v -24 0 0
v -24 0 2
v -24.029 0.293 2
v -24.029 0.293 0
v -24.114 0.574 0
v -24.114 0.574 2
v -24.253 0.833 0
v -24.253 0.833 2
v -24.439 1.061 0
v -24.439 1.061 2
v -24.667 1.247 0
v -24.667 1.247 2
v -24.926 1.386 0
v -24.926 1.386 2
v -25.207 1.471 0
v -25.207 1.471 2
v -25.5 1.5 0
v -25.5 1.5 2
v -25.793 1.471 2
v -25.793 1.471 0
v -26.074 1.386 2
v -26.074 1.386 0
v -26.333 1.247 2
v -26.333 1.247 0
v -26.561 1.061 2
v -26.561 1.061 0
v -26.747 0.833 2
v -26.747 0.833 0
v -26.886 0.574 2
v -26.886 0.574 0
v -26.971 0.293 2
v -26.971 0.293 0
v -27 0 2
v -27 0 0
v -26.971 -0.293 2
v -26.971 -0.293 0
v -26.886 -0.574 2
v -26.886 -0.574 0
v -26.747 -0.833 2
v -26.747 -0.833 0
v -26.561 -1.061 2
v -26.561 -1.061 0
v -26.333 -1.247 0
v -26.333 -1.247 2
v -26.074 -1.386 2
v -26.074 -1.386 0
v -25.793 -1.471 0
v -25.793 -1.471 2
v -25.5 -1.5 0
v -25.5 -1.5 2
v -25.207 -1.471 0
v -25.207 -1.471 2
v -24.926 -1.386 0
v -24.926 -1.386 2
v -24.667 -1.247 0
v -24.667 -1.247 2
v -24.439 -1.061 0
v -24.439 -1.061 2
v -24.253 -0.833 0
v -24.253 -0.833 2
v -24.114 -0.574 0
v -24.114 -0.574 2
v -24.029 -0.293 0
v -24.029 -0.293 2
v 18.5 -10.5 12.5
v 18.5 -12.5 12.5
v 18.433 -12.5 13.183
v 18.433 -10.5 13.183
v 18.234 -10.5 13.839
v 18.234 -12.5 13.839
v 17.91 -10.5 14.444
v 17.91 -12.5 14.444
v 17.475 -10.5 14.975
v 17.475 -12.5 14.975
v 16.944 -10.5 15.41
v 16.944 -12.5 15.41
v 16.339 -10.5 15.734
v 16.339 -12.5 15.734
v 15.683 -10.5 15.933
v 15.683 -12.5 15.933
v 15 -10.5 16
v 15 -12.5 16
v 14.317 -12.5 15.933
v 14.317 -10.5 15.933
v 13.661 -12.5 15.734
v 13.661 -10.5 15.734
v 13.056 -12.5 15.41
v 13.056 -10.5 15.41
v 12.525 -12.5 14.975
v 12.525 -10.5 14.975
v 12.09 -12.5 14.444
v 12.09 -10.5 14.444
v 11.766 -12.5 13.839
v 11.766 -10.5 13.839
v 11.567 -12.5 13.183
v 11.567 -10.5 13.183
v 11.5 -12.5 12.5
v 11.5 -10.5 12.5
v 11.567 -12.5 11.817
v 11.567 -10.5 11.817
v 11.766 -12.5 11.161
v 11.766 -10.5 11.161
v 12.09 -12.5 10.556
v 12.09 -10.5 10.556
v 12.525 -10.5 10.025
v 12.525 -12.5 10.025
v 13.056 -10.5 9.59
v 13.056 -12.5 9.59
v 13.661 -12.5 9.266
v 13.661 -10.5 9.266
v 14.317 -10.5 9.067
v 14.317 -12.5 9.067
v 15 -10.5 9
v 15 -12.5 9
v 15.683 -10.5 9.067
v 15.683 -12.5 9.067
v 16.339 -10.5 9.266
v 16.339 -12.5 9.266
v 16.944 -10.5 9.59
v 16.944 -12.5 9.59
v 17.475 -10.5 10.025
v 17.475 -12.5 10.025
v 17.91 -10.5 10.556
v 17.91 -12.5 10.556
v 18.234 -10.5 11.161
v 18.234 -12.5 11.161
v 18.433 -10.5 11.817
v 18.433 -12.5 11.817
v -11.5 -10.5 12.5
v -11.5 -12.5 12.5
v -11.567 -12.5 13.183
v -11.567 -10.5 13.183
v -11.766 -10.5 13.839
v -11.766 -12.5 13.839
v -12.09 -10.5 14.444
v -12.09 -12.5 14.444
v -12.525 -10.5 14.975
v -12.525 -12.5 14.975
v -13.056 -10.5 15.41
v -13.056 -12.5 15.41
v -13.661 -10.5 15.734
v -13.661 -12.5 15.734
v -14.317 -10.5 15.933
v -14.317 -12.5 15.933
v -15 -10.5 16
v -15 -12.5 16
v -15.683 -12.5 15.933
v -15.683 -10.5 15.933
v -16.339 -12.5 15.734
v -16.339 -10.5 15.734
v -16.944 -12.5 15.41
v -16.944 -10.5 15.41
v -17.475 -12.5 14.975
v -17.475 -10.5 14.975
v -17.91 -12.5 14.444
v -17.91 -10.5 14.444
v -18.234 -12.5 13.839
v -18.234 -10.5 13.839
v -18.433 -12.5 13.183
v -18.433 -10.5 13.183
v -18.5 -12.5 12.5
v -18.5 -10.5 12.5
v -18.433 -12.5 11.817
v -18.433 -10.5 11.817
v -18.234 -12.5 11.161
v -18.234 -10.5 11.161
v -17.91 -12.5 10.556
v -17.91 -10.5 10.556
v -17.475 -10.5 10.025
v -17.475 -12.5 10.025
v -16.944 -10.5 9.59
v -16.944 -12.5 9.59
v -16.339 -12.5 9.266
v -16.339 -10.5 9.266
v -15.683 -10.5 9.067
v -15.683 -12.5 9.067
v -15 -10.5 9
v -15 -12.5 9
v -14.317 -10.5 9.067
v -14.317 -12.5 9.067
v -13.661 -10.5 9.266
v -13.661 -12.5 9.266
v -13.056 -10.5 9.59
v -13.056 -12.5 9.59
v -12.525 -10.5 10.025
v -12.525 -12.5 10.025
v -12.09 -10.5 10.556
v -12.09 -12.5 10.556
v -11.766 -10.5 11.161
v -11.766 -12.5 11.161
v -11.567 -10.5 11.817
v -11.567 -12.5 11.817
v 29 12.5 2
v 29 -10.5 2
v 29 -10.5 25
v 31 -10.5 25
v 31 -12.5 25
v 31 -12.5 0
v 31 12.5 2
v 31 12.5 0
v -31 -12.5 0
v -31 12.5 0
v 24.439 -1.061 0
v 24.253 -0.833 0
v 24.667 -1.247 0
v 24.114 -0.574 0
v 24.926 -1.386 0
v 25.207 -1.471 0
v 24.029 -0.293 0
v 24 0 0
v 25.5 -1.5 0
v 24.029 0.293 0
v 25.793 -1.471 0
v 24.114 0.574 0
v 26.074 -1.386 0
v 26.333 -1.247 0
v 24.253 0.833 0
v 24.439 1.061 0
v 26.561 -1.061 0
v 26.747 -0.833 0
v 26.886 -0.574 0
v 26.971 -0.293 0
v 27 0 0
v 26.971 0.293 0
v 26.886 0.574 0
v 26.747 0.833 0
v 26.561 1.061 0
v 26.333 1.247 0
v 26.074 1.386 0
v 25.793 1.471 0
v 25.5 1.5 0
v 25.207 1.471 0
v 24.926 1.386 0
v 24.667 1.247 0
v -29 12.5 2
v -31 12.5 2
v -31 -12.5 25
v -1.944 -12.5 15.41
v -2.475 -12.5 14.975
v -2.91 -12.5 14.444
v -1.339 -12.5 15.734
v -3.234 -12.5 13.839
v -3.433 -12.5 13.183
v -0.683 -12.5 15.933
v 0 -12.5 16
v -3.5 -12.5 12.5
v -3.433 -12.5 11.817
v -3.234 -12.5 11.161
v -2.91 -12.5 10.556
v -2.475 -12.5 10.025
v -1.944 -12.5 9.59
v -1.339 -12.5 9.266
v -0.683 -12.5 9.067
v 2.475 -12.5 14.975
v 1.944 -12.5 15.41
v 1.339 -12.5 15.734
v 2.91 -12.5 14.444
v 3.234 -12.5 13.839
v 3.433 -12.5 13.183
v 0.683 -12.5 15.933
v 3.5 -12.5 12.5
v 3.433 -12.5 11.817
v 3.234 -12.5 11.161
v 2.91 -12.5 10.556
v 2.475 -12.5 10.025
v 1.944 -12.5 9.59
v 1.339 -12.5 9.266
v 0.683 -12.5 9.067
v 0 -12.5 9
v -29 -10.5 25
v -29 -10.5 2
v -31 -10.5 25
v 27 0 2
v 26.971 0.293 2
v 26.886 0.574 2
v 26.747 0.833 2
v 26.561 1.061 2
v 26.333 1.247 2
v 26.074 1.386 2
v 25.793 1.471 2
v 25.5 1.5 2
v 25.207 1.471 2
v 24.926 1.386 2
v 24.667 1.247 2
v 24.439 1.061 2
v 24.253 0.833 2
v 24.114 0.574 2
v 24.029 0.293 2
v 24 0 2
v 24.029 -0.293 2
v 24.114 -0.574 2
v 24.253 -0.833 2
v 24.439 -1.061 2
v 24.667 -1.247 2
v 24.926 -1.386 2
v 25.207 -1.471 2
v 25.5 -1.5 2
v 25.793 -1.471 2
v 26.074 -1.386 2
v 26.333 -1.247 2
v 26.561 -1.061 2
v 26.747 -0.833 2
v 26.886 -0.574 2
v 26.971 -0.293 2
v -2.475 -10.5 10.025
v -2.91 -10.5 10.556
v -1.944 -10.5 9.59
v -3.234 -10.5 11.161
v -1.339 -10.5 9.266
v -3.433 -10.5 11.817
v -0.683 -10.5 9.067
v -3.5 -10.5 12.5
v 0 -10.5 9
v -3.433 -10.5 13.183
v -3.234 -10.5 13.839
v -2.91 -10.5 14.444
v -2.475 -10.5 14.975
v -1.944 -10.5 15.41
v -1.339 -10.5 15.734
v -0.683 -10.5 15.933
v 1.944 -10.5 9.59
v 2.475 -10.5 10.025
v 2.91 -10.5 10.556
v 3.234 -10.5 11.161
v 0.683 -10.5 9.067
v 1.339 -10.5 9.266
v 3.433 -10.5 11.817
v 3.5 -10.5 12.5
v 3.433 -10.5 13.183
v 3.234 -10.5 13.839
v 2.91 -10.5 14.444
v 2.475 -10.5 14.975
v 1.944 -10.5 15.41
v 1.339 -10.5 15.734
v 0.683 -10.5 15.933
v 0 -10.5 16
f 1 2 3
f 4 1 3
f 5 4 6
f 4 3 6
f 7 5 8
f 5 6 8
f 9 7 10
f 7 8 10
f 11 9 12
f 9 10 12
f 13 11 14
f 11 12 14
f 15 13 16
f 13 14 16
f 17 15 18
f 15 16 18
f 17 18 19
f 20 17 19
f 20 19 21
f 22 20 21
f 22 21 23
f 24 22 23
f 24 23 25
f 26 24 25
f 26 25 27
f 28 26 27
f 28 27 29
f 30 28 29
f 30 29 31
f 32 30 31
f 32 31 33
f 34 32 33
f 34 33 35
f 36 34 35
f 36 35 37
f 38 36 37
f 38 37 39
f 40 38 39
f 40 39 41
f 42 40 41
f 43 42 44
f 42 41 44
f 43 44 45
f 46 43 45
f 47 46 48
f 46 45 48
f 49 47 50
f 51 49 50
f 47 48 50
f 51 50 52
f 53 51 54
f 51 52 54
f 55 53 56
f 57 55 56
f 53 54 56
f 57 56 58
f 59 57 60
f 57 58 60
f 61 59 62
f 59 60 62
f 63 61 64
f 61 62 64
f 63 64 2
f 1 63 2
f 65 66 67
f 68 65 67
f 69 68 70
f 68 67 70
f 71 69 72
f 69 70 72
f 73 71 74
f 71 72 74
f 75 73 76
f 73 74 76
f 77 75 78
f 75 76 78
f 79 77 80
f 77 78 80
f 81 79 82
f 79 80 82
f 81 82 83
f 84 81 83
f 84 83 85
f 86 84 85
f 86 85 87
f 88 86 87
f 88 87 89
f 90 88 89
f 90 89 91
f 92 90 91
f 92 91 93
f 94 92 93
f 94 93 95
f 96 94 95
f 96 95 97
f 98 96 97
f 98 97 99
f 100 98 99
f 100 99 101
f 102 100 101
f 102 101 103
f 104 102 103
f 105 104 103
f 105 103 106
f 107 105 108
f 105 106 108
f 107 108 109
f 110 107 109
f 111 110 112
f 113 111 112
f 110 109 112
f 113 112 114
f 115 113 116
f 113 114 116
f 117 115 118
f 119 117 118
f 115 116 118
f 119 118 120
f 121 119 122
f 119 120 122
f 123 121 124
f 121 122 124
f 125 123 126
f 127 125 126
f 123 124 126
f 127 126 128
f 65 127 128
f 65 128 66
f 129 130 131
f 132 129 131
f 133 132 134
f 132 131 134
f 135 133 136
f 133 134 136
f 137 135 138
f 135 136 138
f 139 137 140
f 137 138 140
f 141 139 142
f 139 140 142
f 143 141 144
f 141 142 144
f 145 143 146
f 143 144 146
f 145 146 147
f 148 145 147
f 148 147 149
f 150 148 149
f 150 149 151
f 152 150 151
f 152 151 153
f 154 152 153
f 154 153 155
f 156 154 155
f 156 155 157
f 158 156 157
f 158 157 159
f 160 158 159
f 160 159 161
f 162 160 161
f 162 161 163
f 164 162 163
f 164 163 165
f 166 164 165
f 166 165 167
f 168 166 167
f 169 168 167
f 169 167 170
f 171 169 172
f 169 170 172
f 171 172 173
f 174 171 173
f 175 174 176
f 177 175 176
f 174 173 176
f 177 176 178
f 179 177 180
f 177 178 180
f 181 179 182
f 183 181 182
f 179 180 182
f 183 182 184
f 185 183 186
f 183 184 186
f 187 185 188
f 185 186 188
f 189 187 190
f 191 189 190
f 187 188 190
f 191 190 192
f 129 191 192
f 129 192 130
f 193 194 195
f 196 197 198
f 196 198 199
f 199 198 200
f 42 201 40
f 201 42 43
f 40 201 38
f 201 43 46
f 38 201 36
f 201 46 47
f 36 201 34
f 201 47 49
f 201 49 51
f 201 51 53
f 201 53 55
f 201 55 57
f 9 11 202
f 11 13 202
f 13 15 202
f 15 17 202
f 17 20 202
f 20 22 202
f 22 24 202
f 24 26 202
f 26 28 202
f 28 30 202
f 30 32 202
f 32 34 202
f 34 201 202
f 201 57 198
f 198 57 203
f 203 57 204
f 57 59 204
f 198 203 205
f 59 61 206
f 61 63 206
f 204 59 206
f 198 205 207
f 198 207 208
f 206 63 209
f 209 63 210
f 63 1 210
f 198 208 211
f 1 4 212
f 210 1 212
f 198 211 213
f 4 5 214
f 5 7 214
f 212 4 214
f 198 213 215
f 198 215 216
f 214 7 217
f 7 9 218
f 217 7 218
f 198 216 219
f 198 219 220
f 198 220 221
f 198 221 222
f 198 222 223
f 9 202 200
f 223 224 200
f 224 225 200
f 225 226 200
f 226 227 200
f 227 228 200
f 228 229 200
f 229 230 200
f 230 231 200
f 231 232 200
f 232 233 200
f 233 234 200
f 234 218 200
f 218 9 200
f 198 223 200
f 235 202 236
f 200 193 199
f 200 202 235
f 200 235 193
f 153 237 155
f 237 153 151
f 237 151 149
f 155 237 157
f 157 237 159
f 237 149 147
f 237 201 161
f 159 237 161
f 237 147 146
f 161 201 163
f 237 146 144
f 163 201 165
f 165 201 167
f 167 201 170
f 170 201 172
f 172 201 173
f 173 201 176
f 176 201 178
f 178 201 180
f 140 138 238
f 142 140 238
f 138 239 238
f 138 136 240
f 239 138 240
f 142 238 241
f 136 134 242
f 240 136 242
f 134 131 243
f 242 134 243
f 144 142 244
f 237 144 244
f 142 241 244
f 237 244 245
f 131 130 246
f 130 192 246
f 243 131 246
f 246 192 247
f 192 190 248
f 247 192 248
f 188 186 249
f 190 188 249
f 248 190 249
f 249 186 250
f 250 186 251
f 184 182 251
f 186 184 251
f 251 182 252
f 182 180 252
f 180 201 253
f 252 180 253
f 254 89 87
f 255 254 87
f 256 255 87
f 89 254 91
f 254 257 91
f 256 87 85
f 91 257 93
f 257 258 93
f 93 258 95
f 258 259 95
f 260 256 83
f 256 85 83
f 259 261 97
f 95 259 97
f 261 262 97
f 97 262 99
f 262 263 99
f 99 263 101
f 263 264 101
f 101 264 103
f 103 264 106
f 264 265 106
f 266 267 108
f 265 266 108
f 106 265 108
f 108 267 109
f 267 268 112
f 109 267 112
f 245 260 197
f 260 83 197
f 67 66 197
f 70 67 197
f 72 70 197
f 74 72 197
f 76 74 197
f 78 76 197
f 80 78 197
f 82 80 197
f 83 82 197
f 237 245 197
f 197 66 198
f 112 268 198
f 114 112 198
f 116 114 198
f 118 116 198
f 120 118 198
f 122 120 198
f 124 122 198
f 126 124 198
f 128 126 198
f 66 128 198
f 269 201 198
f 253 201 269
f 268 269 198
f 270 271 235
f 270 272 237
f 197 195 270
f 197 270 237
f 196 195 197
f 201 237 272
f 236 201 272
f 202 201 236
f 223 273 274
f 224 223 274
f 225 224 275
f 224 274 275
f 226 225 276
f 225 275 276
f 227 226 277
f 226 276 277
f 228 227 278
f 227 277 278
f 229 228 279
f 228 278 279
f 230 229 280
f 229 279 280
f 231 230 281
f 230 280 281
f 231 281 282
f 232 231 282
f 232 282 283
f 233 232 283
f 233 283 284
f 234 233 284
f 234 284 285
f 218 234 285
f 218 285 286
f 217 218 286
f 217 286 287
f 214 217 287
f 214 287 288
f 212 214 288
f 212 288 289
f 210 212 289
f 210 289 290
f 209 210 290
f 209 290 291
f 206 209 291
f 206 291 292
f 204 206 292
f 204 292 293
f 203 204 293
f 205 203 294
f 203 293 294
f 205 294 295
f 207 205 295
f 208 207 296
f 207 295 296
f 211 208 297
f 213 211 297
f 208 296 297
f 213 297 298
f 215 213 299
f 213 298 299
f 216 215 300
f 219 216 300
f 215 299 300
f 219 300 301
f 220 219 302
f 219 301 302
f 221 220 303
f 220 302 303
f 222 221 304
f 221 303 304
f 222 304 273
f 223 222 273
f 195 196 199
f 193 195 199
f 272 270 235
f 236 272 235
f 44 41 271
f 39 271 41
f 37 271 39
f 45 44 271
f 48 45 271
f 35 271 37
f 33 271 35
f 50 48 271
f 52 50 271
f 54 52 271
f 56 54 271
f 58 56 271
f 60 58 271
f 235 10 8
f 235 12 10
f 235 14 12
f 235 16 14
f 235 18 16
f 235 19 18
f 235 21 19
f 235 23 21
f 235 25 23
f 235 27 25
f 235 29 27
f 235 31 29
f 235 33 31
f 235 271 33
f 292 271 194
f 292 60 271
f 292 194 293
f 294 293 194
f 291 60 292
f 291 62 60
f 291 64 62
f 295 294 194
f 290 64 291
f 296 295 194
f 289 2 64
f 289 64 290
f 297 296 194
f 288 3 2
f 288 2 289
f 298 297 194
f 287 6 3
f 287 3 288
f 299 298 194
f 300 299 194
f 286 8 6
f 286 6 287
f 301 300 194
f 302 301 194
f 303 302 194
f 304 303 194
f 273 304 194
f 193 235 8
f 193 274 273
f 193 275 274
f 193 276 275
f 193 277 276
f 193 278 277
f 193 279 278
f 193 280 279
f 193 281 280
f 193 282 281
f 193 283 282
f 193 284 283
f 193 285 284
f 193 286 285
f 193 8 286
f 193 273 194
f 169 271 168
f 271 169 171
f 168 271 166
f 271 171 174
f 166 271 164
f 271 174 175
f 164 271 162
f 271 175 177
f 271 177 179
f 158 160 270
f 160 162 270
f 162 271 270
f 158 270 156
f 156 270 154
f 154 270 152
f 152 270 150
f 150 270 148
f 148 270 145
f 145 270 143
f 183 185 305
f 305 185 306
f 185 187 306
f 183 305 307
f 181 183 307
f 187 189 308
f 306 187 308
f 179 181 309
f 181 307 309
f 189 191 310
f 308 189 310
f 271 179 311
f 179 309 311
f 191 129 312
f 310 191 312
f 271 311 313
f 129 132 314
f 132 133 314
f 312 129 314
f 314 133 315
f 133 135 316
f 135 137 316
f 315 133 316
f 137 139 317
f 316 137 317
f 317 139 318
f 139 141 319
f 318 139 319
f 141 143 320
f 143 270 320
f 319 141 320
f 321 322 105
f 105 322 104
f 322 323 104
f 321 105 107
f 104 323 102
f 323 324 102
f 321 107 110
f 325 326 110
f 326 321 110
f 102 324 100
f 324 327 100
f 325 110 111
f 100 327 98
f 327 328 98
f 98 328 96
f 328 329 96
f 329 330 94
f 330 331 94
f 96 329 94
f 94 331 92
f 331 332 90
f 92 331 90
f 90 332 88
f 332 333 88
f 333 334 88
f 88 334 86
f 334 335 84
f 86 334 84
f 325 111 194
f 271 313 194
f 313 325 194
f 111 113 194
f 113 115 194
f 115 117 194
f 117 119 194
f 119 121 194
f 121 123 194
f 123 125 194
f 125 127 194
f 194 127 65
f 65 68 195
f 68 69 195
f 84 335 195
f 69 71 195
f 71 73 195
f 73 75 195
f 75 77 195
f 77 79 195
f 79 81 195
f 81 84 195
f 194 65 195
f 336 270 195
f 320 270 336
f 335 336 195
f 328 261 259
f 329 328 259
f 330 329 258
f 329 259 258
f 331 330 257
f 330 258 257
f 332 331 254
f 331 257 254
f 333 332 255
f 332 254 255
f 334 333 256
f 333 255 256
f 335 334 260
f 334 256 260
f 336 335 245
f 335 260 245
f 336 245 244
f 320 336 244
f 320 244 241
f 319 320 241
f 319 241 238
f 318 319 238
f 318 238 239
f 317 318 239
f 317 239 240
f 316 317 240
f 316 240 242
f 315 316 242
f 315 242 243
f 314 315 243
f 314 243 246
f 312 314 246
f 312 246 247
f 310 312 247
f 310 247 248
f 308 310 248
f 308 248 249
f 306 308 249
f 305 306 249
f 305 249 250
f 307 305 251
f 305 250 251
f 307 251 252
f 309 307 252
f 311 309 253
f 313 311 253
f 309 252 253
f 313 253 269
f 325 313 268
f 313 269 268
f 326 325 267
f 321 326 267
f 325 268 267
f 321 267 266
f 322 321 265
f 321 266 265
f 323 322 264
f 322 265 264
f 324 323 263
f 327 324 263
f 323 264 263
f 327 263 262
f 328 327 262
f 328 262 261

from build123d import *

# Parameters (mm, degrees)
F0_W     = 62
F0_H     = 25
F1_DEPTH = 25
F2_R     = 3.5
F3_DEPTH = 25
F4_W     = 58
F4_H     = 23
F5_DEPTH = 23
F7_DEPTH = 62.001
F8_R     = 1.5
F9_DEPTH = 2.001


with BuildPart() as f1:
    # F0 (on Top) → F1 (new body)
    with BuildSketch(Plane.XY):
        Rectangle(F0_W, F0_H)
    extrude(amount=F1_DEPTH)

    # F2 (on face) → F3 (cut)
    with BuildSketch(Plane.XZ.offset(12.5)):
        with Locations((0, 12.5)):
            Circle(F2_R)
        with Locations((-15, 12.5)):
            Circle(F2_R)
        with Locations((15, 12.5)):
            Circle(F2_R)
    extrude(amount=-F3_DEPTH, mode=Mode.SUBTRACT)

    # F4 (on face) → F5 (cut)
    with BuildSketch(Plane.XY.offset(25)):
        with Locations((0, 1)):
            Rectangle(F4_W, F4_H)
    extrude(amount=-F5_DEPTH, mode=Mode.SUBTRACT)

    # F6 (on face) → F7 (cut, through all)
    with BuildSketch(Plane.YZ.offset(31)):
        Polygon((12.5, 25), (-10.5, 25), (12.5, 2), align=None)
    extrude(amount=-F7_DEPTH, mode=Mode.SUBTRACT)

    # F8 (on face) → F9 (cut, through all)
    with BuildSketch(Plane.XY.offset(2)):
        with Locations((-25.5, 0)):
            Circle(F8_R)
        with Locations((25.5, 0)):
            Circle(F8_R)
    extrude(amount=-F9_DEPTH, mode=Mode.SUBTRACT)


solid = f1.part
